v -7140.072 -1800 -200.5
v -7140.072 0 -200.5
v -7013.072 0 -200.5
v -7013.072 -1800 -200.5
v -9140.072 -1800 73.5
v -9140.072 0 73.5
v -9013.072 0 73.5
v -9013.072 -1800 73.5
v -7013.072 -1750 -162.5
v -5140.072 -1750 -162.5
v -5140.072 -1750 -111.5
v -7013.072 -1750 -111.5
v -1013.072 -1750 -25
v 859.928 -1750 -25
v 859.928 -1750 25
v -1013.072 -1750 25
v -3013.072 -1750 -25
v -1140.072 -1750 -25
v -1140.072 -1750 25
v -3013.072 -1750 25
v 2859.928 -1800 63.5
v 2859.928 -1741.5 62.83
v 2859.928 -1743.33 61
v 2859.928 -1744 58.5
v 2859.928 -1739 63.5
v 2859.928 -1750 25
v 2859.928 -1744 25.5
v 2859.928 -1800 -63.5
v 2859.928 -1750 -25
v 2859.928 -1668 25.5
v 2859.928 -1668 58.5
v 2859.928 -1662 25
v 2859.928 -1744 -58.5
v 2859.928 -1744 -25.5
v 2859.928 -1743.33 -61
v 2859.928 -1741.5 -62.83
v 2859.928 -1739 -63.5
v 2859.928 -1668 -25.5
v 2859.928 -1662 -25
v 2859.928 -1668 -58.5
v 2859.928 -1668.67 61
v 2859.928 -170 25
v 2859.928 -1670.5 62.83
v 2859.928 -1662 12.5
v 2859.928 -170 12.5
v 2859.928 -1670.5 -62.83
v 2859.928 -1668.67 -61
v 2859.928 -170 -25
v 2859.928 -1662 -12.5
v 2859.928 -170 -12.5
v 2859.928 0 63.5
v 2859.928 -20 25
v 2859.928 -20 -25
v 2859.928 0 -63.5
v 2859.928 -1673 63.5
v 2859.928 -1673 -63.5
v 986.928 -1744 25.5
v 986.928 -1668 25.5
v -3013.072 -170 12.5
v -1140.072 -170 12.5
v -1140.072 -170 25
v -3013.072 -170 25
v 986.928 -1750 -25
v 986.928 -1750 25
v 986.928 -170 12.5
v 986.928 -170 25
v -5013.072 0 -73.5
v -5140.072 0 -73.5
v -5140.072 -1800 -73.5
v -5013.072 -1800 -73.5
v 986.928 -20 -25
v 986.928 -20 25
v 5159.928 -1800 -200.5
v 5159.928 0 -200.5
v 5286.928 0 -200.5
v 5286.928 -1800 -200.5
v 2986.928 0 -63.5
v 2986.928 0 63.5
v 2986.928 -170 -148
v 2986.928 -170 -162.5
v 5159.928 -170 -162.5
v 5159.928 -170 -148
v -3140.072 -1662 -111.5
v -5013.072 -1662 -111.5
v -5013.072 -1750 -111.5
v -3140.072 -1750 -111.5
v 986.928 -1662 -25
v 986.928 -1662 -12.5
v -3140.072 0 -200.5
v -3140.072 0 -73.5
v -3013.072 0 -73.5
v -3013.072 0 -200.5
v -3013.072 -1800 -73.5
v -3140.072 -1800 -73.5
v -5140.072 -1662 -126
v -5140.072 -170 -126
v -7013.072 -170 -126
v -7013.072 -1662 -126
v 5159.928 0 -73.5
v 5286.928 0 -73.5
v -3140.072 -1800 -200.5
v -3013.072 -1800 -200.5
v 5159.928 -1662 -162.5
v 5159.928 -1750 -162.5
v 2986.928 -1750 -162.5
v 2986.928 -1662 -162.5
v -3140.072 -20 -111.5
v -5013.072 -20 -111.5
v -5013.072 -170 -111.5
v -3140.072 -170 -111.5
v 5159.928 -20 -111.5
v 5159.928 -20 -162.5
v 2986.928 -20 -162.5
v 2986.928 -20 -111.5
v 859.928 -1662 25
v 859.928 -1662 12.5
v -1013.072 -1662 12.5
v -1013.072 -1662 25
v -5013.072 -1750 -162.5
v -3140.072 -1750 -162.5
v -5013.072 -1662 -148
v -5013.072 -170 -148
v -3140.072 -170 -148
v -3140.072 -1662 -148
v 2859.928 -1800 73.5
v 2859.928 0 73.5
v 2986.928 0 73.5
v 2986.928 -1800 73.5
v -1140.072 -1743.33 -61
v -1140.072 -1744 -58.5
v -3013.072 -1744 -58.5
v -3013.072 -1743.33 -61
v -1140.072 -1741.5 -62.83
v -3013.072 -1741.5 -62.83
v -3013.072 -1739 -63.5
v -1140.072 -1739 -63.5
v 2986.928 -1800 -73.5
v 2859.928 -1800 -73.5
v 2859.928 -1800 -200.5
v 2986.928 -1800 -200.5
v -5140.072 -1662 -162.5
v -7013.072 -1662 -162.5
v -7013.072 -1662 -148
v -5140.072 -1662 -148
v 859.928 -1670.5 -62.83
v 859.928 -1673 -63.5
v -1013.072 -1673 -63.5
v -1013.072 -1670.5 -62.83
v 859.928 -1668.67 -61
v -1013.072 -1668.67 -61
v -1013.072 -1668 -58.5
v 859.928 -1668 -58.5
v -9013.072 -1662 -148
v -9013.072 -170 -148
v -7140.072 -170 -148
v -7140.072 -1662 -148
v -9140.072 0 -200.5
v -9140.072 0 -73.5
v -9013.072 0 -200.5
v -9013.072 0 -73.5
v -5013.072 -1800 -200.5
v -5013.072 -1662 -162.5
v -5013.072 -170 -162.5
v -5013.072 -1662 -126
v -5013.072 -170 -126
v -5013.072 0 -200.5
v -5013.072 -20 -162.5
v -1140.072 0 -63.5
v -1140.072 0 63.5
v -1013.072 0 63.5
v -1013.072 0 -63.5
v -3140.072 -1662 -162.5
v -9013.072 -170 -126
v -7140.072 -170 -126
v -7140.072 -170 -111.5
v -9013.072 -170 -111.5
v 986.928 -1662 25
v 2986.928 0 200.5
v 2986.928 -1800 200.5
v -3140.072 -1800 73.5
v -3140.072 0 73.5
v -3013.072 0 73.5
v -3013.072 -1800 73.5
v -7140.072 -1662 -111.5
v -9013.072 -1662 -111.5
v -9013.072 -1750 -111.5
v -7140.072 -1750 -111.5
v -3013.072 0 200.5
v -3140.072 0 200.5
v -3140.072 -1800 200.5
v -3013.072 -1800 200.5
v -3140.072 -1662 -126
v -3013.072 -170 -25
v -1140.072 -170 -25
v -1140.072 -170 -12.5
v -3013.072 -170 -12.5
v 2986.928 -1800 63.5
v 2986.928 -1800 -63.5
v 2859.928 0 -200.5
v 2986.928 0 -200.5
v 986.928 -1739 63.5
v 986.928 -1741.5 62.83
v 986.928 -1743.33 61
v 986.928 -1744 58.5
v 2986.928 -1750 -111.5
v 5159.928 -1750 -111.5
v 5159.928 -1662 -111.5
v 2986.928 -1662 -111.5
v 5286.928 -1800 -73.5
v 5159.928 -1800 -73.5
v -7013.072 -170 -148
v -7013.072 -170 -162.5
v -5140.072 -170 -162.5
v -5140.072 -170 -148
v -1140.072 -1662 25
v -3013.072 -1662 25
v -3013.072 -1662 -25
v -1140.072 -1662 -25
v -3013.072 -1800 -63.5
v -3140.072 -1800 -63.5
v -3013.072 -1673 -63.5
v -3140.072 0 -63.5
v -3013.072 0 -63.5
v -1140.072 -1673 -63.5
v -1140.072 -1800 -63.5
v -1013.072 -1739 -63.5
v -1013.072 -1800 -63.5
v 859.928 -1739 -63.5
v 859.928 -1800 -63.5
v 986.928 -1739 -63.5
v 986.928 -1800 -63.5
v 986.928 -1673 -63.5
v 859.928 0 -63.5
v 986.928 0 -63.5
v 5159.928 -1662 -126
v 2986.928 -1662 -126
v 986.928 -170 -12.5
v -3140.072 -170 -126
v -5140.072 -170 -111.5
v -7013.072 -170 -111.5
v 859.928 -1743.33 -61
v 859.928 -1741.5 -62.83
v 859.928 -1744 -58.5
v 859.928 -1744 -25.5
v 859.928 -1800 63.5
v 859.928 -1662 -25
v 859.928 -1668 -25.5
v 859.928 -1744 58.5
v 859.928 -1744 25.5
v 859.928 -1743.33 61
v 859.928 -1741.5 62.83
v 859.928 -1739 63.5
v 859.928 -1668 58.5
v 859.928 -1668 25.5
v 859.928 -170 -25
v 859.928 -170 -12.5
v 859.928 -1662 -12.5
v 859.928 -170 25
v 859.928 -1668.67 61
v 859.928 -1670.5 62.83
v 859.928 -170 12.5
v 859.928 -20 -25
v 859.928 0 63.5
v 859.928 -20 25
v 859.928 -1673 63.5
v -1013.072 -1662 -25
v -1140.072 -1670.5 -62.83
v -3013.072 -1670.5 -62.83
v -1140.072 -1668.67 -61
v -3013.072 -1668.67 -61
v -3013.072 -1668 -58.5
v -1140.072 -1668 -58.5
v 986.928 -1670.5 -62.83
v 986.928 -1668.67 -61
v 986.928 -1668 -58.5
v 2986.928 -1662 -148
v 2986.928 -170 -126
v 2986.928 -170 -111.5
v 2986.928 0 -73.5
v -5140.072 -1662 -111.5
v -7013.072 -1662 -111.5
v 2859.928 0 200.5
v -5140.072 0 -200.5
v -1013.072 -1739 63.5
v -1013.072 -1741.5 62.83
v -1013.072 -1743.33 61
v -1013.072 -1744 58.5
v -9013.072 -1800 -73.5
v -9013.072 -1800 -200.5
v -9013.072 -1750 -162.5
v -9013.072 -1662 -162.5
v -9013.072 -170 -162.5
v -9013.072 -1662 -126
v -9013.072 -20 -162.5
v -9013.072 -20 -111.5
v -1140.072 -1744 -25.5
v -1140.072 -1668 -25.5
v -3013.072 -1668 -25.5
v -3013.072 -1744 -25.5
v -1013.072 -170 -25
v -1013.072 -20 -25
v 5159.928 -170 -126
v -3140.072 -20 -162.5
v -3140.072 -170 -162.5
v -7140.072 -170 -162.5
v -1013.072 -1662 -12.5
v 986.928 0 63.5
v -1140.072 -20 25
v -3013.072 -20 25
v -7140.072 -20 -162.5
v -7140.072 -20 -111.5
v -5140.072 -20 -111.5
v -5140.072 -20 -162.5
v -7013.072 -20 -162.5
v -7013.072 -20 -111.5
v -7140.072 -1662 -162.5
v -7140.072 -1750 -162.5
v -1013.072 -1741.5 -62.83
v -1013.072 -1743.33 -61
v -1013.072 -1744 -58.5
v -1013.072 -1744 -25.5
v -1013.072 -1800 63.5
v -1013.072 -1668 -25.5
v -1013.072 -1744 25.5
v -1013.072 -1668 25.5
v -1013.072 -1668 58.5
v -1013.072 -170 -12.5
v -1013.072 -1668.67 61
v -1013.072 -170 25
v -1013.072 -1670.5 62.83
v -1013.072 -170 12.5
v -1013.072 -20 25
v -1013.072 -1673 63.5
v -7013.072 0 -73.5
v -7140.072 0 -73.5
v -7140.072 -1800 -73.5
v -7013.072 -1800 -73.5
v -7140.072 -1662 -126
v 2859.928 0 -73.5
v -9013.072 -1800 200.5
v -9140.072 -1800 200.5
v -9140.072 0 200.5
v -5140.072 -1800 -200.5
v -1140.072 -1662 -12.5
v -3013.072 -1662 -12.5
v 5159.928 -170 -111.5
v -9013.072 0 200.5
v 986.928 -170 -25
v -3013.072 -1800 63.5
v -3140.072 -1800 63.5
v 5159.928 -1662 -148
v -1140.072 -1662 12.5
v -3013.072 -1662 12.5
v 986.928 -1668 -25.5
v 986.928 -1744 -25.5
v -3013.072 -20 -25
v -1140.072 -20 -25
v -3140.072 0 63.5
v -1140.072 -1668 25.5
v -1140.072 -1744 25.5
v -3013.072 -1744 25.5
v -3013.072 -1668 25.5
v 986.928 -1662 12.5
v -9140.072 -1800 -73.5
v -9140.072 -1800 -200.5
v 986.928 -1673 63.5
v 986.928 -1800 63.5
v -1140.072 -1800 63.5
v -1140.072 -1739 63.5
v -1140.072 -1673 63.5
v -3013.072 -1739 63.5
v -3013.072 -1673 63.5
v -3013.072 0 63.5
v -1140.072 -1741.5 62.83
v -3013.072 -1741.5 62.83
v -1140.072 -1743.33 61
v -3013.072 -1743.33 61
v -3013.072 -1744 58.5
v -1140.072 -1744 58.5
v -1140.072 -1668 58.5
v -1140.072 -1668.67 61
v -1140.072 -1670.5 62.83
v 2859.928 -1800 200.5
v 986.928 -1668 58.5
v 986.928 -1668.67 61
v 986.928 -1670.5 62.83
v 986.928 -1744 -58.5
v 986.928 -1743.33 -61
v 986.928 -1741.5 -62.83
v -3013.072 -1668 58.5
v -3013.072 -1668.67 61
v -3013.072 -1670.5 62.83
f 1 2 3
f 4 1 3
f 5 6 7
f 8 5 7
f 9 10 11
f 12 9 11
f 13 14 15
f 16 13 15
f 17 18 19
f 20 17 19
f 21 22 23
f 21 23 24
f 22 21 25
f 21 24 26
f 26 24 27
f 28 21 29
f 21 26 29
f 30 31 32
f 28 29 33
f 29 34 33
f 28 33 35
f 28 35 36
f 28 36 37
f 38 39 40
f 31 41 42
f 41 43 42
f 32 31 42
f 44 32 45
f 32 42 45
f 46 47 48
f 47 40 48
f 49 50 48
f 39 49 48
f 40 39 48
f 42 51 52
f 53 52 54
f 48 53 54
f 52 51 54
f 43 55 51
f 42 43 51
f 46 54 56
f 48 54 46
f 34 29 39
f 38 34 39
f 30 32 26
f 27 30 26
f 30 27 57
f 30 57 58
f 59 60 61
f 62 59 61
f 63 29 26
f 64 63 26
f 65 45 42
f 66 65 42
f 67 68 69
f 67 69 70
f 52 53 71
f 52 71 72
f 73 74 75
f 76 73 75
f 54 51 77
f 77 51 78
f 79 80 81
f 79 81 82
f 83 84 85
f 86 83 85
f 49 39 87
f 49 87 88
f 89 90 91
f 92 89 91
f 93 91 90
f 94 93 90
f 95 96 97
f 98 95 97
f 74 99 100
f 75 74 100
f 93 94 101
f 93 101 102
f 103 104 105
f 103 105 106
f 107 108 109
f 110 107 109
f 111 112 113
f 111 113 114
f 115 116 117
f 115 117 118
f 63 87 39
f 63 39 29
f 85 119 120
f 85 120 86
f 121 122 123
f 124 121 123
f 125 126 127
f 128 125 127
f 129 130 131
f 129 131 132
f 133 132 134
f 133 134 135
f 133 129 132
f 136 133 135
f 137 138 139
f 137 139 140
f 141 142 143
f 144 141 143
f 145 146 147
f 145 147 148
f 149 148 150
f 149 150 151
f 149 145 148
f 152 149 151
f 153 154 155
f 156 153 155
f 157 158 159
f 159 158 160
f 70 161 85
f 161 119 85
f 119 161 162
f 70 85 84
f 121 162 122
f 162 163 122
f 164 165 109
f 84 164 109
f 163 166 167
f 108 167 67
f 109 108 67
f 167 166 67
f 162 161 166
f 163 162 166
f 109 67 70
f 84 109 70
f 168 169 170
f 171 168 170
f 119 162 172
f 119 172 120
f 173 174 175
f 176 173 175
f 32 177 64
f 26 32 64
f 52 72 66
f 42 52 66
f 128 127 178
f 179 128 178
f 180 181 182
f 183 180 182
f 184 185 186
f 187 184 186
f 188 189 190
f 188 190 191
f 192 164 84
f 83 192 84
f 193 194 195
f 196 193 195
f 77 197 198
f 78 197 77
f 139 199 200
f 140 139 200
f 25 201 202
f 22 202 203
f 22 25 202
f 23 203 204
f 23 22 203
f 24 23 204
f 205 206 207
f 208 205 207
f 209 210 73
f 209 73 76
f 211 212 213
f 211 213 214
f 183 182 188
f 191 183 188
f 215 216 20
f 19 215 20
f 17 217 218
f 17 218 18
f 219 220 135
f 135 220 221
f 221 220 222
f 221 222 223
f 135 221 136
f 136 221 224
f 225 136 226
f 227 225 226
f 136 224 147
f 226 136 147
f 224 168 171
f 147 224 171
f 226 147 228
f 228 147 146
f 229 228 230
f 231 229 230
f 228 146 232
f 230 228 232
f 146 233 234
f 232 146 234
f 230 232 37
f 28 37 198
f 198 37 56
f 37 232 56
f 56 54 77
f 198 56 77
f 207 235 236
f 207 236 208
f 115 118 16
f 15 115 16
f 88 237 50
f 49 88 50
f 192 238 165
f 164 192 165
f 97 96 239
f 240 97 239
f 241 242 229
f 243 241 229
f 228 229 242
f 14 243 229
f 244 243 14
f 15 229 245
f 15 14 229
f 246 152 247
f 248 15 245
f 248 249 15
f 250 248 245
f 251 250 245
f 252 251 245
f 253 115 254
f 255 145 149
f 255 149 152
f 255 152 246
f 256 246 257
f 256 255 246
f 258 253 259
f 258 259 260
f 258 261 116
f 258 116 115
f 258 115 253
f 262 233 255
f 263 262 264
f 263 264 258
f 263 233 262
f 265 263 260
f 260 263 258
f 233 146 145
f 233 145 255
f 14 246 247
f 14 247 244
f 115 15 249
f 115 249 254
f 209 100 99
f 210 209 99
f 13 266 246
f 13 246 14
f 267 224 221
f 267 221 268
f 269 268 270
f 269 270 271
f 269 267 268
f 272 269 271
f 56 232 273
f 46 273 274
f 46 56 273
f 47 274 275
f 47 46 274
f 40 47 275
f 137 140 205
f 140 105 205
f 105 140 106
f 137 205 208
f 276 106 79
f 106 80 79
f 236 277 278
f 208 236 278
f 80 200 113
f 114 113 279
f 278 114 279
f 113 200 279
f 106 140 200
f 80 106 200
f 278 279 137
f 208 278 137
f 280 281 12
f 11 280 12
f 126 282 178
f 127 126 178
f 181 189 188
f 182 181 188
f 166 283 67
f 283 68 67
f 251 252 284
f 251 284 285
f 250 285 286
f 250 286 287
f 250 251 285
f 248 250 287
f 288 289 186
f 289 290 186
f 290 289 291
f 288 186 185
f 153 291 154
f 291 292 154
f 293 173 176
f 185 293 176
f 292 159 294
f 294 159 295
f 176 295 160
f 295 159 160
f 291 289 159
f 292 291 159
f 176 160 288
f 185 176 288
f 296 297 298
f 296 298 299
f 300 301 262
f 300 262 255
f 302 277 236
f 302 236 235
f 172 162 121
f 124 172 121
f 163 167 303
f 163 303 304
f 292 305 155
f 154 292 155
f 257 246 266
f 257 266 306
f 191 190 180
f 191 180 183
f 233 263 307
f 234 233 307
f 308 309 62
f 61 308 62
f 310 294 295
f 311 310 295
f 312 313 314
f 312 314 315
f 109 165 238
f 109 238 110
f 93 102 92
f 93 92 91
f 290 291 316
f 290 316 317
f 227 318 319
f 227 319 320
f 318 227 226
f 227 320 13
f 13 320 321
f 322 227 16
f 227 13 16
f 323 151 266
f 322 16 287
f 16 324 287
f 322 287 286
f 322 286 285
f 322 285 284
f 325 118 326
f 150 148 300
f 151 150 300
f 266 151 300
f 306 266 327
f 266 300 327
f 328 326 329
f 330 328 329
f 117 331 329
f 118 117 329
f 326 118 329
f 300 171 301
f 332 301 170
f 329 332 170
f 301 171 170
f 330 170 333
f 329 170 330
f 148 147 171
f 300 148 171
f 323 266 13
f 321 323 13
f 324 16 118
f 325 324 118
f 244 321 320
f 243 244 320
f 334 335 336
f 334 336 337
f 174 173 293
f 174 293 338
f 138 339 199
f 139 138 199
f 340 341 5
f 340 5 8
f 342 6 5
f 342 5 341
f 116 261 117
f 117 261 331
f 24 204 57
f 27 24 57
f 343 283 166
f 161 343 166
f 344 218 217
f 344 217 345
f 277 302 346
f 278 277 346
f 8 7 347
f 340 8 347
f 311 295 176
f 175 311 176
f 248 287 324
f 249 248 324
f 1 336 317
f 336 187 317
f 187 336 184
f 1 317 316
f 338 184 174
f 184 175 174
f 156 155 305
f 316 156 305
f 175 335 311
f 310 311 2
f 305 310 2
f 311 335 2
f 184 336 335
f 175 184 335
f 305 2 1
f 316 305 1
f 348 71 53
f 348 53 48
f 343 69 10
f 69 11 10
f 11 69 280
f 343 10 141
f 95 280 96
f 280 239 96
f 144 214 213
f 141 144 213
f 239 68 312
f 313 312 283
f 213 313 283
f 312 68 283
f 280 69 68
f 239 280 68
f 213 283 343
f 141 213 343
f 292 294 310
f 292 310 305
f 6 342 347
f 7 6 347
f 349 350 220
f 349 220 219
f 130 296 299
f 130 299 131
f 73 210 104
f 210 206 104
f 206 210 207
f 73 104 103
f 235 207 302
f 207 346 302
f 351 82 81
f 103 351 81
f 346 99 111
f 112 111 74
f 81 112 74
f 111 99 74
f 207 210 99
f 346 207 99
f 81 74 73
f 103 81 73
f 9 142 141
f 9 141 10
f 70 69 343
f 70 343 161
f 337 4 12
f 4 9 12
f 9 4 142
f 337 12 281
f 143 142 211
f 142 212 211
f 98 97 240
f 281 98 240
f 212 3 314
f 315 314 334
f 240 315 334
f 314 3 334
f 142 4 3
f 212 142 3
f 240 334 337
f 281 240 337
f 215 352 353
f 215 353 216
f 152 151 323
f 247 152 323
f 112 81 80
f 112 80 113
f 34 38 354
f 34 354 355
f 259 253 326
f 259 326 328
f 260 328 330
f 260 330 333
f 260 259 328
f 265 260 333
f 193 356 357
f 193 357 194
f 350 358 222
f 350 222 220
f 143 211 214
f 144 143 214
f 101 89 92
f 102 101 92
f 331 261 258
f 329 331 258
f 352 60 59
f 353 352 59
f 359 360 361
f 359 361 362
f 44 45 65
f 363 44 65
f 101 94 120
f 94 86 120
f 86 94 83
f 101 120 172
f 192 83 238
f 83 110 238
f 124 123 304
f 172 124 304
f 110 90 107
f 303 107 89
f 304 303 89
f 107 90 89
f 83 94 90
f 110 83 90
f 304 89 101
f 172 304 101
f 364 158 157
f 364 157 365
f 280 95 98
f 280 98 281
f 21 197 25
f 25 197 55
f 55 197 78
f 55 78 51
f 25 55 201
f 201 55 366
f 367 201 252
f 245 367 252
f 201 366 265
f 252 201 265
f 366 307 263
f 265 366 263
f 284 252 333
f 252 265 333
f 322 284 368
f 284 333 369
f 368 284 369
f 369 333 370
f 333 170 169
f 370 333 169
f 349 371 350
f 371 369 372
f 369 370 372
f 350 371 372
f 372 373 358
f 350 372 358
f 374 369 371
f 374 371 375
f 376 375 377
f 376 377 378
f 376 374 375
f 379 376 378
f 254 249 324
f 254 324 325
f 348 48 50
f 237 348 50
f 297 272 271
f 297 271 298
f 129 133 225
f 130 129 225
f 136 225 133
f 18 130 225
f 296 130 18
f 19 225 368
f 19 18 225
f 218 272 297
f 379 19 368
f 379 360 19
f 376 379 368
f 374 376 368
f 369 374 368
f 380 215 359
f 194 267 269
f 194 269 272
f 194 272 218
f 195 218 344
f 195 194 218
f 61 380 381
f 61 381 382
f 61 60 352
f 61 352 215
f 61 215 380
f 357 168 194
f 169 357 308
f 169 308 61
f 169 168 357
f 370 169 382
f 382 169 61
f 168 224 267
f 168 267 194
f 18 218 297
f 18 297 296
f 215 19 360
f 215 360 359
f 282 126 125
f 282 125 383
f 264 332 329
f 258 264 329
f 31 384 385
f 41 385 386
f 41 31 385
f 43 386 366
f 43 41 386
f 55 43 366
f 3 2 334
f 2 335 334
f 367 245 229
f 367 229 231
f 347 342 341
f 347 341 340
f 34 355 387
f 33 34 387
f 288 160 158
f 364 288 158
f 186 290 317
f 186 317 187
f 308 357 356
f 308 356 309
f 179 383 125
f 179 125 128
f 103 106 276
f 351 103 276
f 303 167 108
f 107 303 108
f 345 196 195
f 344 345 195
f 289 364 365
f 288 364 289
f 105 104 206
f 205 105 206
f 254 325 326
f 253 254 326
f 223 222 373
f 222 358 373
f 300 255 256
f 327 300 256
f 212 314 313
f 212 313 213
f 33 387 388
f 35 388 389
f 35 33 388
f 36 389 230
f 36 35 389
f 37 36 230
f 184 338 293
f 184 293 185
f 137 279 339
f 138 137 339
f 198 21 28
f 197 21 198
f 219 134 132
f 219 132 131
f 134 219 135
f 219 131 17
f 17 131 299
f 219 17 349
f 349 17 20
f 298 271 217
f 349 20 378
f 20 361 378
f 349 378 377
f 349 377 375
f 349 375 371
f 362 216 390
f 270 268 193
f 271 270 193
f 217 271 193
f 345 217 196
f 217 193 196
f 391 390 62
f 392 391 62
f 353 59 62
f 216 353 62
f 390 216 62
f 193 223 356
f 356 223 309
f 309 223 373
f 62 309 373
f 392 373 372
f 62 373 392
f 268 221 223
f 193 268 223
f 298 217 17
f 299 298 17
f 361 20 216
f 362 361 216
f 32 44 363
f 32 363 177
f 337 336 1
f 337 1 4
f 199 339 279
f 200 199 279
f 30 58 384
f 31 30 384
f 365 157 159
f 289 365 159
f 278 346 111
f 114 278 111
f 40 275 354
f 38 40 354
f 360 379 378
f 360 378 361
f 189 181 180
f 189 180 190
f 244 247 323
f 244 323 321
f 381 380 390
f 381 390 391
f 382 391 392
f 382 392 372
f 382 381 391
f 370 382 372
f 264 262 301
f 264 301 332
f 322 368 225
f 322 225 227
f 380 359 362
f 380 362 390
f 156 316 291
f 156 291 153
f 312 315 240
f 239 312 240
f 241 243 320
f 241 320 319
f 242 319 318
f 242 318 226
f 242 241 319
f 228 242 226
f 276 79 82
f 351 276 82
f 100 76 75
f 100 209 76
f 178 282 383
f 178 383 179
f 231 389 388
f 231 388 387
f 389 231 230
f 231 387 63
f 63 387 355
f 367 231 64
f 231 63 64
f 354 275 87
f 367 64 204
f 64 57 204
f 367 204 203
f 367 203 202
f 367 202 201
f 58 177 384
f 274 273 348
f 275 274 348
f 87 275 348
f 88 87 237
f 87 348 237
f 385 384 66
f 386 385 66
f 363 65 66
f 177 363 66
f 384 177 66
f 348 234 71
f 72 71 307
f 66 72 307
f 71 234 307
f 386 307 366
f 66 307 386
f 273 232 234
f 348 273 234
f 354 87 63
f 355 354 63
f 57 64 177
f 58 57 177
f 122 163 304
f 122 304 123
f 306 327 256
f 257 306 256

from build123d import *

# Parameters (mm, degrees)
F0_W        = 1873
F0_H        = 25
F0_W_2      = 63.5
F0_W_3      = 127
F0_H_2      = 51
F1_DEPTH    = 1800
F2_W        = 150
F2_H        = 50
F2_W_2      = 88
F3_DEPTH    = 6000
F4_DEPTH    = 50
F0_H_3      = 127
F5_DEPTH    = 1800
F0_H_4      = 22
F0_H_5      = 52.5
F0_W_4      = 2173
F6_W        = 150
F6_H        = 51
F6_W_2      = 88
F7_DEPTH    = 2370
F8_W        = 150
F8_H        = 51
F8_W_2      = 88
F9_DEPTH    = 6090
F7_FACE_W   = 2173
F7_FACE_H   = 50
F7_FACE_H_2 = 20
F9_FACE_W   = 1873
F9_FACE_H   = 50
F9_FACE_H_2 = 20
F10_DEPTH   = 50
F12_DEPTH   = 6000


# Not quite as in the source:
# - a feature names something its author has since deleted; it is built from what else it names


with BuildPart() as f1:
    # F0 (on Front) → F1 (new body)
    with BuildSketch(Plane.XZ):
        with Locations((-2076.5718817711, 0)):
            Rectangle(F0_W, F0_H)
        with Locations((-3044.8218817711, 0)):
            Rectangle(F0_W_2, F0_H)
        with Locations((-1076.5718817711, 0)):
            Rectangle(F0_W_3, F0_H)
        with Locations((-76.5718817711, 0)):
            Rectangle(F0_W, F0_H)
        with Locations((923.4281182289, 0)):
            Rectangle(F0_W_3, F0_H)
        with Locations((1923.4281182289, 0)):
            Rectangle(F0_W, F0_H)
        with Locations((2891.6781182289, 0)):
            Rectangle(F0_W_2, F0_H)
        Polygon((-3013.0718817711, -63.5), (-3013.0718817711, -12.5), (-3076.5718817711, -12.5), (-3076.5718817711, 12.5), (-3013.0718817711, 12.5), (-3013.0718817711, 63.5), (-3140.0718817711, 63.5), (-3140.0718817711, -63.5), align=None)
        with Locations((-1076.5718817711, -38)):
            Rectangle(F0_W_3, F0_H_2)
        with Locations((-1076.5718817711, 38)):
            Rectangle(F0_W_3, F0_H_2)
        with Locations((923.4281182289, -38)):
            Rectangle(F0_W_3, F0_H_2)
        with Locations((923.4281182289, 38)):
            Rectangle(F0_W_3, F0_H_2)
        Polygon((2923.4281182289, 12.5), (2923.4281182289, -12.5), (2859.9281182289, -12.5), (2859.9281182289, -63.5), (2986.9281182289, -63.5), (2986.9281182289, 63.5), (2859.9281182289, 63.5), (2859.9281182289, 12.5), align=None)
    extrude(amount=F1_DEPTH)

    # F2 (on face) → F3 (join)
    with BuildSketch(Plane(origin=(-3140.0718817711, 0, 0), x_dir=(0, -1, 0), z_dir=(-1, 0, 0))):
        with Locations((95, 0)):
            Rectangle(F2_W, F2_H)
        with Locations((1706, 0)):
            Rectangle(F2_W_2, F2_H)
    extrude(amount=-F3_DEPTH)

    # F4 (cut): faces of the model
    f4_faces = [f1.faces().sort_by_distance(p)[0] for p in [
        (1923.4281182289, -1775, 12.5),
        (-76.5718817711, -1775, 12.5),
        (-2076.5718817711, -1775, 12.5),
        (-2076.5718817711, -10, 12.5),
        (-76.5718817711, -10, 12.5),
        (1923.4281182289, -10, 12.5),
    ]]
    extrude(f4_faces, amount=-F4_DEPTH, mode=Mode.SUBTRACT)

    # F11 (on face) → F12 (join)
    with BuildSketch(Plane.YZ.offset(2986.9281182289)):
        with BuildLine():
            Line((-1668, -58.5), (-1668, -25.5))
            Line((-1668, -25.5), (-1744, -25.5))
            Line((-1744, -25.5), (-1744, -58.5))
            ThreePointArc((-1744, -58.5), (-1742.5355339059, -62.0355339059), (-1739, -63.5))
            Line((-1739, -63.5), (-1673, -63.5))
            ThreePointArc((-1673, -63.5), (-1669.4644660941, -62.0355339059), (-1668, -58.5))
        make_face()
        with BuildLine():
            Line((-1744, 25.5), (-1668, 25.5))
            Line((-1668, 25.5), (-1668, 58.5))
            ThreePointArc((-1668, 58.5), (-1669.4644660941, 62.0355339059), (-1673, 63.5))
            Line((-1673, 63.5), (-1739, 63.5))
            ThreePointArc((-1739, 63.5), (-1742.5355339059, 62.0355339059), (-1744, 58.5))
            Line((-1744, 58.5), (-1744, 25.5))
        make_face()
    extrude(amount=-F12_DEPTH)


with BuildPart() as f5:
    # F0 (on Front) → F5 (new body)
    with BuildSketch(Plane.XZ):
        with Locations((-3076.5718817711, 137)):
            Rectangle(F0_W_3, F0_H_3)
    extrude(amount=F5_DEPTH)


with BuildPart() as f5b:
    # F0 (on Front) → F5, piece 2 (new body)
    with BuildSketch(Plane.XZ):
        Polygon((-3140.0718817711, -200.5), (-3013.0718817711, -200.5), (-3013.0718817711, -73.5), (-3140.0718817711, -73.5), (-3140.0718817711, -126), (-3140.0718817711, -148), align=None)
        with Locations((-4076.5718817711, -137)):
            Rectangle(F0_W, F0_H_4)
        with Locations((-5076.5718817711, -174.25)):
            Rectangle(F0_W_3, F0_H_5)
        with Locations((-5076.5718817711, -137)):
            Rectangle(F0_W_3, F0_H_4)
        with Locations((-5076.5718817711, -99.75)):
            Rectangle(F0_W_3, F0_H_5)
        with Locations((-6076.5718817711, -137)):
            Rectangle(F0_W, F0_H_4)
        with Locations((-7076.5718817711, -174.25)):
            Rectangle(F0_W_3, F0_H_5)
        with Locations((-7076.5718817711, -137)):
            Rectangle(F0_W_3, F0_H_4)
        with Locations((-7076.5718817711, -99.75)):
            Rectangle(F0_W_3, F0_H_5)
        with Locations((-8076.5718817711, -137)):
            Rectangle(F0_W, F0_H_4)
        Polygon((-9013.0718817711, -200.5), (-9013.0718817711, -148), (-9013.0718817711, -126), (-9013.0718817711, -73.5), (-9140.0718817711, -73.5), (-9140.0718817711, -200.5), align=None)
    extrude(amount=F5_DEPTH)

    # F8 (on face) → F9 (join)
    with BuildSketch(Plane(origin=(-9140.0718817711, 0, 0), x_dir=(0, -1, 0), z_dir=(-1, 0, 0))):
        with Locations((95, -137)):
            Rectangle(F8_W, F8_H)
        with Locations((1706, -137)):
            Rectangle(F8_W_2, F8_H)
    extrude(amount=-F9_DEPTH)


with BuildPart() as f5c:
    # F0 (on Front) → F5, piece 3 (new body)
    with BuildSketch(Plane.XZ):
        with Locations((-9076.5718817711, 137)):
            Rectangle(F0_W_3, F0_H_3)
    extrude(amount=F5_DEPTH)


with BuildPart() as f5d:
    # F0 (on Front) → F5, piece 4 (new body)
    with BuildSketch(Plane.XZ):
        Polygon((2859.9281182289, -200.5), (2986.9281182289, -200.5), (2986.9281182289, -148), (2986.9281182289, -126), (2986.9281182289, -73.5), (2859.9281182289, -73.5), align=None)
        with Locations((4073.4281182289, -137)):
            Rectangle(F0_W_4, F0_H_4)
        Polygon((5159.9281182289, -126), (5159.9281182289, -148), (5159.9281182289, -200.5), (5286.9281182289, -200.5), (5286.9281182289, -73.5), (5159.9281182289, -73.5), align=None)
    extrude(amount=F5_DEPTH)

    # F6 (on face) → F7 (join)
    with BuildSketch(Plane.YZ.offset(5286.9281182289)):
        with Locations((-95, -137)):
            Rectangle(F6_W, F6_H)
        with Locations((-1706, -137)):
            Rectangle(F6_W_2, F6_H)
    extrude(amount=-F7_DEPTH)


with BuildPart() as f5e:
    # F0 (on Front) → F5, piece 5 (new body)
    with BuildSketch(Plane.XZ):
        with Locations((2923.4281182289, 137)):
            Rectangle(F0_W_3, F0_H_3)
    extrude(amount=F5_DEPTH)


with BuildPart() as f10_tool:
    # F7_face (on face) + F9_face (on face) → F10 (new body)
    with BuildSketch(Plane(origin=(4073.4281182289, -1775, -148), x_dir=(1, 0, 0), z_dir=(0, 0, -1))):
        Rectangle(F7_FACE_W, F7_FACE_H)
        with Locations((0, -1765)):
            Rectangle(F7_FACE_W, F7_FACE_H_2)
    with BuildSketch(Plane(origin=(-4076.5718817711, -1775, -148), x_dir=(1, 0, 0), z_dir=(0, 0, -1))):
        Rectangle(F9_FACE_W, F9_FACE_H)
        with Locations((-2000, 0)):
            Rectangle(F9_FACE_W, F9_FACE_H)
        with Locations((-4000, 0)):
            Rectangle(F9_FACE_W, F9_FACE_H)
        with Locations((-4000, -1765)):
            Rectangle(F9_FACE_W, F9_FACE_H_2)
        with Locations((-2000, -1765)):
            Rectangle(F9_FACE_W, F9_FACE_H_2)
        with Locations((0, -1765)):
            Rectangle(F9_FACE_W, F9_FACE_H_2)
    extrude(amount=-F10_DEPTH)


with BuildPart() as f5b_1:
    add(f5b.part)

    # F10: cut by f10_tool
    add(f10_tool.part, mode=Mode.SUBTRACT)


with BuildPart() as f5d_1:
    add(f5d.part)

    # F10: cut by f10_tool
    add(f10_tool.part, mode=Mode.SUBTRACT)


solid = Compound([f1.part, f5.part, f5c.part, f5e.part, f5b_1.part, f5d_1.part])
